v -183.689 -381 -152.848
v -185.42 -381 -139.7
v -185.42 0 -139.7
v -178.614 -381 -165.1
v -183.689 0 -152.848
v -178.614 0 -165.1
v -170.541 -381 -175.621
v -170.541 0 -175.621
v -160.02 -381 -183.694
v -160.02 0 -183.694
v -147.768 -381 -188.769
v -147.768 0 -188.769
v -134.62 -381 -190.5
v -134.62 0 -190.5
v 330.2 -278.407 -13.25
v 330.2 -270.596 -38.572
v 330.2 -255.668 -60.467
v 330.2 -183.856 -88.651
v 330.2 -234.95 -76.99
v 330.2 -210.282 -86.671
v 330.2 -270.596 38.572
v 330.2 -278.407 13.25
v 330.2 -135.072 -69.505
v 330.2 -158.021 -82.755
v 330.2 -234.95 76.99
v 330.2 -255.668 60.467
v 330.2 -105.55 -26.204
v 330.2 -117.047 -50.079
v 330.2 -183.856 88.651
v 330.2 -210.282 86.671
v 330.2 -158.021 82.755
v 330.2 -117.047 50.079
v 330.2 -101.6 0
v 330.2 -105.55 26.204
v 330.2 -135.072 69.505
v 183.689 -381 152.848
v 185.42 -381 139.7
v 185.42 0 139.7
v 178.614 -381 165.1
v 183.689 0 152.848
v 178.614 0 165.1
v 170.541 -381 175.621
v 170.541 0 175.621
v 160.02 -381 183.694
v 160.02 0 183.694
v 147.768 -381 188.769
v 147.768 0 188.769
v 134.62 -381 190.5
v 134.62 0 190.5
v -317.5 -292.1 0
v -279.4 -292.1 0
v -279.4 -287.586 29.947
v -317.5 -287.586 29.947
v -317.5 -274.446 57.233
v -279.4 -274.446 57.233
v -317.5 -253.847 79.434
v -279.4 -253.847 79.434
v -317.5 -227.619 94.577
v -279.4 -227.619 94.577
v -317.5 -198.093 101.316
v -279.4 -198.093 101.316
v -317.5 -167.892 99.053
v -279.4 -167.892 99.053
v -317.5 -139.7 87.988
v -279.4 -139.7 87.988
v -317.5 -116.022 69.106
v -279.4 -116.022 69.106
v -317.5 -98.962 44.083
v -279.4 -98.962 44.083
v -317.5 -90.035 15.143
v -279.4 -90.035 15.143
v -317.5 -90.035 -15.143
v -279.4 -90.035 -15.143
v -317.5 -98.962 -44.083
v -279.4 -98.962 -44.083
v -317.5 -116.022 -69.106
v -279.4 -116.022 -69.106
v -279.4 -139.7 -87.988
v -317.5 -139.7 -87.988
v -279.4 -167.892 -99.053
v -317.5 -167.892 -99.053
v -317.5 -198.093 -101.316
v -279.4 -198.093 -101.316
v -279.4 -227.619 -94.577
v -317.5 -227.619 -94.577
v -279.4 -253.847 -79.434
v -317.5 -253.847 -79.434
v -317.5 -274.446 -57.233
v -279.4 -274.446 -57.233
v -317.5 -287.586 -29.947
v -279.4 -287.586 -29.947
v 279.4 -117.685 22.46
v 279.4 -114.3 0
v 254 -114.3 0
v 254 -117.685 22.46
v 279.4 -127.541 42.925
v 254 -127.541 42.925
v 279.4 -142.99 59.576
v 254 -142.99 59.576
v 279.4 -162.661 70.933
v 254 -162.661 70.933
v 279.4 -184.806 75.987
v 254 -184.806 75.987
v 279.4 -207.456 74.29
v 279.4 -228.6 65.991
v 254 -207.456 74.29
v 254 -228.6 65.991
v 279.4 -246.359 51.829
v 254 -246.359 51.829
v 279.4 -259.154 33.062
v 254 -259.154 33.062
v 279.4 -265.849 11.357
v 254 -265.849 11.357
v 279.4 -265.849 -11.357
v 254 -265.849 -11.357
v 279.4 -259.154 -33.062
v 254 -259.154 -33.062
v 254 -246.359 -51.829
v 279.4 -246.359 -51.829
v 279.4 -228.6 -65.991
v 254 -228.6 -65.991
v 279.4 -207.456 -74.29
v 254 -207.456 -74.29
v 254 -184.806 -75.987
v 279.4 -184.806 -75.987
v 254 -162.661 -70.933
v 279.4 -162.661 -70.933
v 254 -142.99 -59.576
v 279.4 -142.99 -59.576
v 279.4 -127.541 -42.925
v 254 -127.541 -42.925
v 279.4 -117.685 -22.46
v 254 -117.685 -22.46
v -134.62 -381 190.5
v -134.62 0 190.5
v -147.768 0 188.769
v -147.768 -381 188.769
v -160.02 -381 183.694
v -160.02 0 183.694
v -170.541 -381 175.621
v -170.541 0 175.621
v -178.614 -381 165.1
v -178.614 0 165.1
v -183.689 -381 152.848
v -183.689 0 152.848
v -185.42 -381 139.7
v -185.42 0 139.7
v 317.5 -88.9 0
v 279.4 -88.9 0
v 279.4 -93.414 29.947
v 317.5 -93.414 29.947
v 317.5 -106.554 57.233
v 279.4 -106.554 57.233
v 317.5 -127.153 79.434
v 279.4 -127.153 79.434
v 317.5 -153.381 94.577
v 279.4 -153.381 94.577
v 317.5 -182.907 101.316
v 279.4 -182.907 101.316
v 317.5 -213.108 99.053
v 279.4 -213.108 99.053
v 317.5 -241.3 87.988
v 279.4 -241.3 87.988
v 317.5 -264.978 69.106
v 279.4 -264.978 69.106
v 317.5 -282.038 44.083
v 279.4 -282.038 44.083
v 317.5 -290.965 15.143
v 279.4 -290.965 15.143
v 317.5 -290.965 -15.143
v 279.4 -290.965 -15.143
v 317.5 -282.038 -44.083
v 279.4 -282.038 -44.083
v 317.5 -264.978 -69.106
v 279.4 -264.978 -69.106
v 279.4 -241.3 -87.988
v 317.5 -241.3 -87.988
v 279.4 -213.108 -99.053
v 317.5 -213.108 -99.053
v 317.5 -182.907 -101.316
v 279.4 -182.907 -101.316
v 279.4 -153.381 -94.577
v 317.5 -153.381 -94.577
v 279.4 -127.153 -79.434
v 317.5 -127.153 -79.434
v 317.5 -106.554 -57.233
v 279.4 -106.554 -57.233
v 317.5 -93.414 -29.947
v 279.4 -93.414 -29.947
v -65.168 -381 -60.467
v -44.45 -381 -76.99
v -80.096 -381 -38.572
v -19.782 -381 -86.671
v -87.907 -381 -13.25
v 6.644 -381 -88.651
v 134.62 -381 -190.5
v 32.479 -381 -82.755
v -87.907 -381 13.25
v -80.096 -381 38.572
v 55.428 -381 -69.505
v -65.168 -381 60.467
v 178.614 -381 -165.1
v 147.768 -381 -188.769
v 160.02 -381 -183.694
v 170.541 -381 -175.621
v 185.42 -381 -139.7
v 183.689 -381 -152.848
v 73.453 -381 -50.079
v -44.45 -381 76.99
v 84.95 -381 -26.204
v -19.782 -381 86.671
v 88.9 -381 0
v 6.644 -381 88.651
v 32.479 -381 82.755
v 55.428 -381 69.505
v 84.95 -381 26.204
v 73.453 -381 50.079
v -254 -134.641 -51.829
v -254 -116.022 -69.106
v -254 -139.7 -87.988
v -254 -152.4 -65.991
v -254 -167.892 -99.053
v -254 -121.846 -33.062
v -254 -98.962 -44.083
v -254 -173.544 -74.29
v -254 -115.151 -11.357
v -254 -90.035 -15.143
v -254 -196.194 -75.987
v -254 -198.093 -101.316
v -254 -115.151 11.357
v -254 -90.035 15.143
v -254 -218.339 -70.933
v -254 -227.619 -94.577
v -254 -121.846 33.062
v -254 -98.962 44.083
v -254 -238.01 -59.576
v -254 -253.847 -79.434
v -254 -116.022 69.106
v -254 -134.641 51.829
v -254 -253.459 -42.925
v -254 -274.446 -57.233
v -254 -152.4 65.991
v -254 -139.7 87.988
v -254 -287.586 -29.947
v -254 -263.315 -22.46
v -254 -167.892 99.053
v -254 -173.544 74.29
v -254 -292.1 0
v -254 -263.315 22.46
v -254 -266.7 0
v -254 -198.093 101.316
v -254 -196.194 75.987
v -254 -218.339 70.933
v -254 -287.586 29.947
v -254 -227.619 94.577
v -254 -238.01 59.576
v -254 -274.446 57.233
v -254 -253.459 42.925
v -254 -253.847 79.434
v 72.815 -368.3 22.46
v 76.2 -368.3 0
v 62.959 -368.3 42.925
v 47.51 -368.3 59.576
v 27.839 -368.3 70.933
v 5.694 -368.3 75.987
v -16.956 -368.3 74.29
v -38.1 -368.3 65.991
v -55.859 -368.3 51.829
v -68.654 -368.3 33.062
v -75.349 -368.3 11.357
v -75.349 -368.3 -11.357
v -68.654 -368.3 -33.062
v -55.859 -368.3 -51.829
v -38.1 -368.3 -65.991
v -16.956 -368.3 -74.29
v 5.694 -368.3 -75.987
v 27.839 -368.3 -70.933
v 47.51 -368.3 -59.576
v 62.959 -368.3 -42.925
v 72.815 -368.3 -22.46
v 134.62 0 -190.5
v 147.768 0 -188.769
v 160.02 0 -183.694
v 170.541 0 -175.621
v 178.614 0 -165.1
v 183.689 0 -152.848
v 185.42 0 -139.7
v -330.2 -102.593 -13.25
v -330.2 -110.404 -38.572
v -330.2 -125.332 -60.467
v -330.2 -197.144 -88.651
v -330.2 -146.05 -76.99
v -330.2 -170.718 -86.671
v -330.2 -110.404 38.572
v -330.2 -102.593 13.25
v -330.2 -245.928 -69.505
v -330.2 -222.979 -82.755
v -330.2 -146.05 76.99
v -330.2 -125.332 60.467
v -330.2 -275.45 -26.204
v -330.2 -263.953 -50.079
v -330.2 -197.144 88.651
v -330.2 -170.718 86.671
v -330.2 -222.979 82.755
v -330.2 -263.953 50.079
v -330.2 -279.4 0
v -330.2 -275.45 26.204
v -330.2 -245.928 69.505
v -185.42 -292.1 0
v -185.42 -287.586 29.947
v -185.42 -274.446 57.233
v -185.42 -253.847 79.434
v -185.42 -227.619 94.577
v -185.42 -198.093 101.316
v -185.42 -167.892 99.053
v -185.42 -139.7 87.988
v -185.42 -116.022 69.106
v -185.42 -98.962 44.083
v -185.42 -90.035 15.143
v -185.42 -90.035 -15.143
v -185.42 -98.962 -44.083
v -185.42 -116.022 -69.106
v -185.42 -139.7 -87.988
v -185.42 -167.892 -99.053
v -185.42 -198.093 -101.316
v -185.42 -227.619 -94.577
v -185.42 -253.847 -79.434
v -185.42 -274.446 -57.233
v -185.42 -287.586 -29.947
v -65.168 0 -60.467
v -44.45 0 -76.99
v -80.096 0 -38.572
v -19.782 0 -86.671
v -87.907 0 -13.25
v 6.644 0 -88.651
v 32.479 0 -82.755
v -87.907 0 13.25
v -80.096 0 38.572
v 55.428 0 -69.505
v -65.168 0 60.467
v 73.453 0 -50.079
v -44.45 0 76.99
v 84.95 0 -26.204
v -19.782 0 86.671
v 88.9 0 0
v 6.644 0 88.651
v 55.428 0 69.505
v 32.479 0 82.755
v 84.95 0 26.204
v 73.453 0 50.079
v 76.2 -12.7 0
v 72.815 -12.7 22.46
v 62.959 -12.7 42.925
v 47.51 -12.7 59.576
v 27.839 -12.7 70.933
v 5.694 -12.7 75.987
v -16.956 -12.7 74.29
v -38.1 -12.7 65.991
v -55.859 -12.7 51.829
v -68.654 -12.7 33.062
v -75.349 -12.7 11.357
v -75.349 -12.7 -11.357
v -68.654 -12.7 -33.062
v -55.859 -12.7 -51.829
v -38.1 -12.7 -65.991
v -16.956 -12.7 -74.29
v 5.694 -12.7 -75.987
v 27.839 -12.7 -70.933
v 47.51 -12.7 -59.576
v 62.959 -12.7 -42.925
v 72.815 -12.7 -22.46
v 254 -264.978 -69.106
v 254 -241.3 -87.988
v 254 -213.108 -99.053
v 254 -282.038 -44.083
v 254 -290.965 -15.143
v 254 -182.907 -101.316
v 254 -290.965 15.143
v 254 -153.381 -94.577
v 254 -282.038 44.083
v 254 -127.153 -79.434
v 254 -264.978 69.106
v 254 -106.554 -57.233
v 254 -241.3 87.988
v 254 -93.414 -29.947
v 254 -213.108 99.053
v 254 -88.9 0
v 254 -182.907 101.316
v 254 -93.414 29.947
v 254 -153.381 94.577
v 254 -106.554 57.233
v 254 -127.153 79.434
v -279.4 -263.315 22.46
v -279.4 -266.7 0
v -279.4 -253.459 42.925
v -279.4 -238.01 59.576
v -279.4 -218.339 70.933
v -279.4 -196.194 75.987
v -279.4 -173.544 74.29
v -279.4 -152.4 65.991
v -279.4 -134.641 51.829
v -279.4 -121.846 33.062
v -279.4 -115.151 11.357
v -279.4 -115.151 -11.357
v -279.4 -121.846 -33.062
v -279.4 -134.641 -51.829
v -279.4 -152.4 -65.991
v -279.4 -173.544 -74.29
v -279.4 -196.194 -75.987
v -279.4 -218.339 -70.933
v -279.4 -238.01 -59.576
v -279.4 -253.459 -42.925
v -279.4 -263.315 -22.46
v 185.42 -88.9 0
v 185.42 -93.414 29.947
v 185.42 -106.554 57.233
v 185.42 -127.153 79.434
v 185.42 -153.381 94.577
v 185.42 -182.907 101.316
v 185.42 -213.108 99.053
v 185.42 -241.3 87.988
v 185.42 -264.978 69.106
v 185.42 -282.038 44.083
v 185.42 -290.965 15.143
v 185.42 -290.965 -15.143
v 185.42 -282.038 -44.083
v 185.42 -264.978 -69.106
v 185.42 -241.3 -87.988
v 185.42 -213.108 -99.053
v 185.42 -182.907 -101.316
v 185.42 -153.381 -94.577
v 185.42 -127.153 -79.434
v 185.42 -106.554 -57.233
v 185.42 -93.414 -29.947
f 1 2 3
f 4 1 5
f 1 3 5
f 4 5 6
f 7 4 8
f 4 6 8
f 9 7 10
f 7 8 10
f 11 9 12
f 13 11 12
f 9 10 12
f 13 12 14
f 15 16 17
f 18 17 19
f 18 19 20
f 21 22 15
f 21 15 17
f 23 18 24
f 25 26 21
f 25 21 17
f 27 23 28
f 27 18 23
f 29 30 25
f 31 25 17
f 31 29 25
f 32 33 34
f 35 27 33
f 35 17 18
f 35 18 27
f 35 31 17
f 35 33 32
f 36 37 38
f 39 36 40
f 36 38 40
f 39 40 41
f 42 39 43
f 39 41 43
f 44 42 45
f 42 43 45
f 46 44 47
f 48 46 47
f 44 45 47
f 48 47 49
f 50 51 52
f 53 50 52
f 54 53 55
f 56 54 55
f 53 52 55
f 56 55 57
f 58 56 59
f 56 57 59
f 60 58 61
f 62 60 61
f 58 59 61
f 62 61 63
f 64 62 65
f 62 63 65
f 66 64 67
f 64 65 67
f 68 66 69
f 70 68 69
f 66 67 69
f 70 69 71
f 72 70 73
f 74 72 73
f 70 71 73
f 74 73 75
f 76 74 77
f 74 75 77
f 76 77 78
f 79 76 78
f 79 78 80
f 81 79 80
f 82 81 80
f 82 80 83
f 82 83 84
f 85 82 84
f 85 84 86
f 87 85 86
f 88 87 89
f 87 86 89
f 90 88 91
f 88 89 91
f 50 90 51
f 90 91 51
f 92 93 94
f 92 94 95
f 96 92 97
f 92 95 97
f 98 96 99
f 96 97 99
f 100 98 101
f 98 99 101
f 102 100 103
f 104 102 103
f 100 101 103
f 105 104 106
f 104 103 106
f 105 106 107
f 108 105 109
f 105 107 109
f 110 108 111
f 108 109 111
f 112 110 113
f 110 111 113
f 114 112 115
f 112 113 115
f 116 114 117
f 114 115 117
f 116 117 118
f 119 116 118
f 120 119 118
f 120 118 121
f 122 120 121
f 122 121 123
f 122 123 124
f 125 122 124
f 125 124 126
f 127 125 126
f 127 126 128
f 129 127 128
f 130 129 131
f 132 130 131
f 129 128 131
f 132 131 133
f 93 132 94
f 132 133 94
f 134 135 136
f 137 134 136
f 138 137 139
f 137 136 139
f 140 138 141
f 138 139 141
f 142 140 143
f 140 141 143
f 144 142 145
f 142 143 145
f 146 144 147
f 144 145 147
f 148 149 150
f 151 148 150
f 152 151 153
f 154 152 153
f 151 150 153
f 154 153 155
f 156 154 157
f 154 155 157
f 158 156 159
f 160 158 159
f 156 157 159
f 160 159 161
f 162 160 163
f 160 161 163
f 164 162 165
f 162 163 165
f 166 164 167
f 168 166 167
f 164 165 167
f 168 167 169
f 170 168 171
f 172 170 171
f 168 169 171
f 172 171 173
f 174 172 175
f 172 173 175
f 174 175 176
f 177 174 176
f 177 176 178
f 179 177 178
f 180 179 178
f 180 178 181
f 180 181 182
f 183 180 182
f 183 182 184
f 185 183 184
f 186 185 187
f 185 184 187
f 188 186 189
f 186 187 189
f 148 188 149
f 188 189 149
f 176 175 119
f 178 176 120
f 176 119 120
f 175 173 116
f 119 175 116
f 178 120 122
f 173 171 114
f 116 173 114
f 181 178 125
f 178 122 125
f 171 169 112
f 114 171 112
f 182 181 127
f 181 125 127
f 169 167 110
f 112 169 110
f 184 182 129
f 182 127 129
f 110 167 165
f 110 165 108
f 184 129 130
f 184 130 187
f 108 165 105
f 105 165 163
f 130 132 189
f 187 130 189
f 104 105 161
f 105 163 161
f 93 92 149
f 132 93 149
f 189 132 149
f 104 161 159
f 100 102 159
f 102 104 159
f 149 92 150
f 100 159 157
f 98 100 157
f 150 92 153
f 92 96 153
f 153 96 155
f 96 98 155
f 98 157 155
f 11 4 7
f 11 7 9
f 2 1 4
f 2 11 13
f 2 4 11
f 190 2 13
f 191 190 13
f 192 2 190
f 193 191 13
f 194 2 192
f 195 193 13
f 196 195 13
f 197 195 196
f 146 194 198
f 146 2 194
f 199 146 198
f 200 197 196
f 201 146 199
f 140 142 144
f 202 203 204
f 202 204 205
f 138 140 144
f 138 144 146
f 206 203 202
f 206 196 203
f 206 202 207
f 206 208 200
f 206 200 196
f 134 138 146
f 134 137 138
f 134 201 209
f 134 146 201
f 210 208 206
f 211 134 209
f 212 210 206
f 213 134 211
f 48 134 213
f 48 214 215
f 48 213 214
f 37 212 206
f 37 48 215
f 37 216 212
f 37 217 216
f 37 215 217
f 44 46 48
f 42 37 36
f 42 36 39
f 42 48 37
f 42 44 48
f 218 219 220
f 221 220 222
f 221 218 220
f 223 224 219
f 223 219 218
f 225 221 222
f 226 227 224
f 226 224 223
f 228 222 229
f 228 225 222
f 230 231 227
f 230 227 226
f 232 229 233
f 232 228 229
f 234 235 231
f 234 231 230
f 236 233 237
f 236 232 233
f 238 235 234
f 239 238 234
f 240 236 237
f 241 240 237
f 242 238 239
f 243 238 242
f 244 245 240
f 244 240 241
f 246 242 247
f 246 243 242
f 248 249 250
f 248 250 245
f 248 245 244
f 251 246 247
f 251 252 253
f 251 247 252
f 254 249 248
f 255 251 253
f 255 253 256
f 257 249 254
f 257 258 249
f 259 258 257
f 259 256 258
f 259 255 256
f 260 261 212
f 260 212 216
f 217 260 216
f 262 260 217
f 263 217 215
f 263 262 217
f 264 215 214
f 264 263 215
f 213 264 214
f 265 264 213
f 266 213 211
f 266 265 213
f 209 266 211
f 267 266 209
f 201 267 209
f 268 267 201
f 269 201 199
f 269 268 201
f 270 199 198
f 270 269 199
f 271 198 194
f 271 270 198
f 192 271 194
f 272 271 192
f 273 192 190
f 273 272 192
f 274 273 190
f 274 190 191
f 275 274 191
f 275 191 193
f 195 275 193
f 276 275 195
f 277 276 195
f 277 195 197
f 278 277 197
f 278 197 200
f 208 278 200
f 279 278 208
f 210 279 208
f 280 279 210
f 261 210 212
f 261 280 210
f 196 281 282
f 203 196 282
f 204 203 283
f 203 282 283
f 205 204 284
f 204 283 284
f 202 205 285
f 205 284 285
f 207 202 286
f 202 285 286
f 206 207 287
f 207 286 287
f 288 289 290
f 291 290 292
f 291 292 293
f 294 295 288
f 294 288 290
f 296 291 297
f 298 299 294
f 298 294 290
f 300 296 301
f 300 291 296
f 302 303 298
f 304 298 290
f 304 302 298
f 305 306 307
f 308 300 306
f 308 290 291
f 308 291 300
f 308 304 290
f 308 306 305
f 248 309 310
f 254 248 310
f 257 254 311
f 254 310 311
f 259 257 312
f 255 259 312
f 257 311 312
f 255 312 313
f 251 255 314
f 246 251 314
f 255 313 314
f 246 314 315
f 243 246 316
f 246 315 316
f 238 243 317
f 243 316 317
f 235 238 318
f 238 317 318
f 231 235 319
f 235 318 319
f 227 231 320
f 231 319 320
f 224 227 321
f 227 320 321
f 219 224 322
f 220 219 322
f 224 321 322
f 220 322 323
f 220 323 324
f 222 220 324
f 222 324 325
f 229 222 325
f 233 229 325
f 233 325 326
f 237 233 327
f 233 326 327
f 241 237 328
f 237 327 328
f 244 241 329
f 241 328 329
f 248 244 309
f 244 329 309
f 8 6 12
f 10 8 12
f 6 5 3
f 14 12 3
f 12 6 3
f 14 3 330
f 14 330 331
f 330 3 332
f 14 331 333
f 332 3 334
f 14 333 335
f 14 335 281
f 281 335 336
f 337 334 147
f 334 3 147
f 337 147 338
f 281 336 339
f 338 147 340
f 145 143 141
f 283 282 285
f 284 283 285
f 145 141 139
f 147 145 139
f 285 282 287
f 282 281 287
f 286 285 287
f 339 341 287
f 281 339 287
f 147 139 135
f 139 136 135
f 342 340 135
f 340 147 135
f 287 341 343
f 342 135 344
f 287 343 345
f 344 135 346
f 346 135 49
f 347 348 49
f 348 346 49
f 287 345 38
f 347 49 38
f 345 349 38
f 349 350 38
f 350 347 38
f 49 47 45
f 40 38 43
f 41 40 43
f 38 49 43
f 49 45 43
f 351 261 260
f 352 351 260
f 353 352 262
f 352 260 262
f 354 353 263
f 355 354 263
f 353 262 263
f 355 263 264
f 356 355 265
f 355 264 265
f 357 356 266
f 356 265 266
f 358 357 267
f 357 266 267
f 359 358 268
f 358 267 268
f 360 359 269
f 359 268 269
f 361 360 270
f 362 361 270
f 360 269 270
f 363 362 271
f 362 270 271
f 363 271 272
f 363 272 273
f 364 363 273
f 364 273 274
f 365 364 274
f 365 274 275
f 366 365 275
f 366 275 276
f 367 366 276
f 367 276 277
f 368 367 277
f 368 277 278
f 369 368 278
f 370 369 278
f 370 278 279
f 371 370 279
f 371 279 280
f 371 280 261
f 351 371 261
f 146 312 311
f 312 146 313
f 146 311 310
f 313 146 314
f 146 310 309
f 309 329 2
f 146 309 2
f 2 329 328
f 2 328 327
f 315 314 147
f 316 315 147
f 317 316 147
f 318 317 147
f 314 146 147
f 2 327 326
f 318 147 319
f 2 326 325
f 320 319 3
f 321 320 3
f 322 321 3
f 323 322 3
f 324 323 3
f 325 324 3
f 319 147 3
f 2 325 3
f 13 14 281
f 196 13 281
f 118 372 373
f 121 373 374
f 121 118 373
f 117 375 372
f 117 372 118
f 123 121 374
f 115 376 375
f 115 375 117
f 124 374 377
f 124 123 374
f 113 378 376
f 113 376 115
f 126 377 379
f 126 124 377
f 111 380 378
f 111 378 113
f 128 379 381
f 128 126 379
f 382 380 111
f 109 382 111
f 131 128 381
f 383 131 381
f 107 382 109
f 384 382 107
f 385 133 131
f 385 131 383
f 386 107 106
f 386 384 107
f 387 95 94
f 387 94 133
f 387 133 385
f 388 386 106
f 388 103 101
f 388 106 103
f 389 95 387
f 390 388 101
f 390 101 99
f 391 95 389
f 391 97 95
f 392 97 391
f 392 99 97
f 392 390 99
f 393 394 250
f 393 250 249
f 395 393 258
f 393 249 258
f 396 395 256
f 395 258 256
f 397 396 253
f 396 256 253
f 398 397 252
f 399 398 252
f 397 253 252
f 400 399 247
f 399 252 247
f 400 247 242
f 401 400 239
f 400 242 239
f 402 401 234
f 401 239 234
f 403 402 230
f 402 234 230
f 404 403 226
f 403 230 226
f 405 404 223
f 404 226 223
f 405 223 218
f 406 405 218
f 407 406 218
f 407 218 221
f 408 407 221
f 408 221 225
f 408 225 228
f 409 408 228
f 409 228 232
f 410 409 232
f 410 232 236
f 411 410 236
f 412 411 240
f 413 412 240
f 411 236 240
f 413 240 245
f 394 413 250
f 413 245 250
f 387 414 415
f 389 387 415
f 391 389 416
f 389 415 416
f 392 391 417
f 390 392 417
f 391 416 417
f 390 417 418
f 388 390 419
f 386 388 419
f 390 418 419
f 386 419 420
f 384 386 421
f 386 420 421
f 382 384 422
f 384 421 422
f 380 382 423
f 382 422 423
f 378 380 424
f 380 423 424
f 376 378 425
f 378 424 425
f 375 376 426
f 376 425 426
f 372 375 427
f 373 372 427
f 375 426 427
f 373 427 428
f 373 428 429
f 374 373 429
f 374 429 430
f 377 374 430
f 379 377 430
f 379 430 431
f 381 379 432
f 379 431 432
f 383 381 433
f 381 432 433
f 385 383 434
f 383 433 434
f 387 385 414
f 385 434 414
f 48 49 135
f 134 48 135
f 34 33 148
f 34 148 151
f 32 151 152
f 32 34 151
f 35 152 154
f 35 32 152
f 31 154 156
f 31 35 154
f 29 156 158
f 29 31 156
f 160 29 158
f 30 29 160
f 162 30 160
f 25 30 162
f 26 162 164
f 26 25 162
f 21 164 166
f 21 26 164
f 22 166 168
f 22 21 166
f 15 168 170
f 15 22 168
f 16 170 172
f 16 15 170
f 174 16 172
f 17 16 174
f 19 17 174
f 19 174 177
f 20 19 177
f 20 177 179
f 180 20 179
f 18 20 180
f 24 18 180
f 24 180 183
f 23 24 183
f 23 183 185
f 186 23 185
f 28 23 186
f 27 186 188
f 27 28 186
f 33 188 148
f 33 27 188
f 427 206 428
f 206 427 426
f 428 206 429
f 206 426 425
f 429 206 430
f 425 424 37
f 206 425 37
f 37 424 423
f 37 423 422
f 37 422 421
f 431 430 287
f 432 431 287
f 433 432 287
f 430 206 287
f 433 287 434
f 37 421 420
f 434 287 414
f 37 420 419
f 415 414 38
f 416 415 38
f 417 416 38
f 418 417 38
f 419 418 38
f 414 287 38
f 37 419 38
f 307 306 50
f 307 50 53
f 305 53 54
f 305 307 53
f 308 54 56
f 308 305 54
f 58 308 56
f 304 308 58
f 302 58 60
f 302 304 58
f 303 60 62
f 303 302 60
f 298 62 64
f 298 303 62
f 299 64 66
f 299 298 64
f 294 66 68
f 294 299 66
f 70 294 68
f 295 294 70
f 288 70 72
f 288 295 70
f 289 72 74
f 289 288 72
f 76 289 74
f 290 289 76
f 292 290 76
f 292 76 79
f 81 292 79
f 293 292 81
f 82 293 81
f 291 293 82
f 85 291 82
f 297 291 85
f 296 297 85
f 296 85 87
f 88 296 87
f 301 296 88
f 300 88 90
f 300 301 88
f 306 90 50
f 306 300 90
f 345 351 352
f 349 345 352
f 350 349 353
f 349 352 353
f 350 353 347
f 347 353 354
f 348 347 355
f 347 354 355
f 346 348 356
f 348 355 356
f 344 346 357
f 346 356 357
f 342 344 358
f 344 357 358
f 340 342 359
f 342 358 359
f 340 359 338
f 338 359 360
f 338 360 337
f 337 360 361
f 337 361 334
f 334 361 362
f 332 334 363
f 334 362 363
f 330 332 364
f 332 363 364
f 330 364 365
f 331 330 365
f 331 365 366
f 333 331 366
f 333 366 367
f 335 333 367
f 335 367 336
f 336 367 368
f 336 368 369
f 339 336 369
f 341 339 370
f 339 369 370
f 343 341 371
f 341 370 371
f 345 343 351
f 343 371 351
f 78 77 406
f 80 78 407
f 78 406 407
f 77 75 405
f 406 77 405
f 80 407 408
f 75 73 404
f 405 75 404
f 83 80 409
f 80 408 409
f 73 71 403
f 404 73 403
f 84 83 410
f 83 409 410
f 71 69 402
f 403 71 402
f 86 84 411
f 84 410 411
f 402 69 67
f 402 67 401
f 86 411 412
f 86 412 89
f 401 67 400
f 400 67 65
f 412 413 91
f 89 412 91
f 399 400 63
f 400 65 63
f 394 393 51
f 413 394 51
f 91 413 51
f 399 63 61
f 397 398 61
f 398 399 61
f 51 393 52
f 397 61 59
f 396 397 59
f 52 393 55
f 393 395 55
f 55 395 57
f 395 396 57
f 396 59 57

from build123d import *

# Parameters (mm, degrees)
F2_DEPTH  = 381
F3_R      = 101.6
F4_DEPTH  = 68.58
F5_R      = 101.6
F6_DEPTH  = 68.58
F7_R      = 76.2
F8_DEPTH  = 508
F9_SIZE2  = 12.7
F9_SIZE   = 12.7
F11_R     = 76.2
F12_DEPTH = 25.4
F10_R     = 76.2
F13_DEPTH = 25.4
F14_R     = 101.6
F14_R_2   = 76.2
F15_DEPTH = 50.8
F16_R     = 101.6
F17_DEPTH = 50.8
F18_SIZE2 = 12.7
F18_SIZE  = 12.7


with BuildPart() as f2:
    # F1 (on Front) → F2 (new body)
    with BuildSketch(Plane.XZ):
        with BuildLine():
            ThreePointArc((-185.42, -139.7), (-170.541024, -175.621024), (-134.62, -190.5))
            Line((-134.62, -190.5), (134.62, -190.5))
            ThreePointArc((134.62, -190.5), (170.541024, -175.621024), (185.42, -139.7))
            Line((185.42, -139.7), (185.42, 139.7))
            ThreePointArc((185.42, 139.7), (170.541024, 175.621024), (134.62, 190.5))
            Line((134.62, 190.5), (-134.62, 190.5))
            ThreePointArc((-134.62, 190.5), (-170.541024, 175.621024), (-185.42, 139.7))
            Line((-185.42, 139.7), (-185.42, -139.7))
        make_face()
    extrude(amount=F2_DEPTH)

    # F3 (on face) → F4 (join)
    with BuildSketch(Plane.YZ.offset(185.42)):
        with Locations((-190.5, 0)):
            Circle(F3_R)
    extrude(amount=F4_DEPTH)

    # F5 (on face) → F6 (join)
    with BuildSketch(Plane(origin=(-185.42, 0, 0), x_dir=(0, -1, 0), z_dir=(-1, 0, 0))):
        with Locations((190.5, 0)):
            Circle(F5_R)
    extrude(amount=F6_DEPTH)

    # F7 (on face) → F8 (cut)
    with BuildSketch(Plane.XZ.offset(381)):
        Circle(F7_R)
    extrude(amount=-F8_DEPTH, mode=Mode.SUBTRACT)

    # F9
    f9_edges = [f2.edges().sort_by_distance(p)[0] for p in [
        (-76.2, -381, 0),
        (-76.2, 0, 0),
    ]]
    chamfer(f9_edges, length=F9_SIZE, length2=F9_SIZE2)

    # F11 (on face) → F12 (join)
    with BuildSketch(Plane.YZ.offset(254)):
        with Locations((-190.5, 0)):
            Circle(F11_R)
    extrude(amount=F12_DEPTH)

    # F10 (on face) → F13 (join)
    with BuildSketch(Plane(origin=(-254, 0, 0), x_dir=(0, -1, 0), z_dir=(-1, 0, 0))):
        with Locations((190.5, 0)):
            Circle(F10_R)
    extrude(amount=F13_DEPTH)

    # F14 (on face) → F15 (join)
    with BuildSketch(Plane.YZ.offset(279.4)):
        with Locations((-190.5, 0)):
            Circle(F14_R)
        with Locations((-190.5, 0)):
            Circle(F14_R_2, mode=Mode.SUBTRACT)
        with Locations((-190.5, 0)):
            Circle(F14_R)
        with Locations((-190.5, 0)):
            Circle(F14_R_2)
    extrude(amount=F15_DEPTH)

    # F16 (on face) → F17 (join)
    with BuildSketch(Plane(origin=(-279.4, 0, 0), x_dir=(0, -1, 0), z_dir=(-1, 0, 0))):
        with Locations((190.5, 0)):
            Circle(F16_R)
    extrude(amount=F17_DEPTH)

    # F18
    f18_edges = [f2.edges().sort_by_distance(p)[0] for p in [
        (330.2, -292.1, 0),
        (-330.2, -88.9, 0),
    ]]
    chamfer(f18_edges, length=F18_SIZE, length2=F18_SIZE2)


solid = f2.part
